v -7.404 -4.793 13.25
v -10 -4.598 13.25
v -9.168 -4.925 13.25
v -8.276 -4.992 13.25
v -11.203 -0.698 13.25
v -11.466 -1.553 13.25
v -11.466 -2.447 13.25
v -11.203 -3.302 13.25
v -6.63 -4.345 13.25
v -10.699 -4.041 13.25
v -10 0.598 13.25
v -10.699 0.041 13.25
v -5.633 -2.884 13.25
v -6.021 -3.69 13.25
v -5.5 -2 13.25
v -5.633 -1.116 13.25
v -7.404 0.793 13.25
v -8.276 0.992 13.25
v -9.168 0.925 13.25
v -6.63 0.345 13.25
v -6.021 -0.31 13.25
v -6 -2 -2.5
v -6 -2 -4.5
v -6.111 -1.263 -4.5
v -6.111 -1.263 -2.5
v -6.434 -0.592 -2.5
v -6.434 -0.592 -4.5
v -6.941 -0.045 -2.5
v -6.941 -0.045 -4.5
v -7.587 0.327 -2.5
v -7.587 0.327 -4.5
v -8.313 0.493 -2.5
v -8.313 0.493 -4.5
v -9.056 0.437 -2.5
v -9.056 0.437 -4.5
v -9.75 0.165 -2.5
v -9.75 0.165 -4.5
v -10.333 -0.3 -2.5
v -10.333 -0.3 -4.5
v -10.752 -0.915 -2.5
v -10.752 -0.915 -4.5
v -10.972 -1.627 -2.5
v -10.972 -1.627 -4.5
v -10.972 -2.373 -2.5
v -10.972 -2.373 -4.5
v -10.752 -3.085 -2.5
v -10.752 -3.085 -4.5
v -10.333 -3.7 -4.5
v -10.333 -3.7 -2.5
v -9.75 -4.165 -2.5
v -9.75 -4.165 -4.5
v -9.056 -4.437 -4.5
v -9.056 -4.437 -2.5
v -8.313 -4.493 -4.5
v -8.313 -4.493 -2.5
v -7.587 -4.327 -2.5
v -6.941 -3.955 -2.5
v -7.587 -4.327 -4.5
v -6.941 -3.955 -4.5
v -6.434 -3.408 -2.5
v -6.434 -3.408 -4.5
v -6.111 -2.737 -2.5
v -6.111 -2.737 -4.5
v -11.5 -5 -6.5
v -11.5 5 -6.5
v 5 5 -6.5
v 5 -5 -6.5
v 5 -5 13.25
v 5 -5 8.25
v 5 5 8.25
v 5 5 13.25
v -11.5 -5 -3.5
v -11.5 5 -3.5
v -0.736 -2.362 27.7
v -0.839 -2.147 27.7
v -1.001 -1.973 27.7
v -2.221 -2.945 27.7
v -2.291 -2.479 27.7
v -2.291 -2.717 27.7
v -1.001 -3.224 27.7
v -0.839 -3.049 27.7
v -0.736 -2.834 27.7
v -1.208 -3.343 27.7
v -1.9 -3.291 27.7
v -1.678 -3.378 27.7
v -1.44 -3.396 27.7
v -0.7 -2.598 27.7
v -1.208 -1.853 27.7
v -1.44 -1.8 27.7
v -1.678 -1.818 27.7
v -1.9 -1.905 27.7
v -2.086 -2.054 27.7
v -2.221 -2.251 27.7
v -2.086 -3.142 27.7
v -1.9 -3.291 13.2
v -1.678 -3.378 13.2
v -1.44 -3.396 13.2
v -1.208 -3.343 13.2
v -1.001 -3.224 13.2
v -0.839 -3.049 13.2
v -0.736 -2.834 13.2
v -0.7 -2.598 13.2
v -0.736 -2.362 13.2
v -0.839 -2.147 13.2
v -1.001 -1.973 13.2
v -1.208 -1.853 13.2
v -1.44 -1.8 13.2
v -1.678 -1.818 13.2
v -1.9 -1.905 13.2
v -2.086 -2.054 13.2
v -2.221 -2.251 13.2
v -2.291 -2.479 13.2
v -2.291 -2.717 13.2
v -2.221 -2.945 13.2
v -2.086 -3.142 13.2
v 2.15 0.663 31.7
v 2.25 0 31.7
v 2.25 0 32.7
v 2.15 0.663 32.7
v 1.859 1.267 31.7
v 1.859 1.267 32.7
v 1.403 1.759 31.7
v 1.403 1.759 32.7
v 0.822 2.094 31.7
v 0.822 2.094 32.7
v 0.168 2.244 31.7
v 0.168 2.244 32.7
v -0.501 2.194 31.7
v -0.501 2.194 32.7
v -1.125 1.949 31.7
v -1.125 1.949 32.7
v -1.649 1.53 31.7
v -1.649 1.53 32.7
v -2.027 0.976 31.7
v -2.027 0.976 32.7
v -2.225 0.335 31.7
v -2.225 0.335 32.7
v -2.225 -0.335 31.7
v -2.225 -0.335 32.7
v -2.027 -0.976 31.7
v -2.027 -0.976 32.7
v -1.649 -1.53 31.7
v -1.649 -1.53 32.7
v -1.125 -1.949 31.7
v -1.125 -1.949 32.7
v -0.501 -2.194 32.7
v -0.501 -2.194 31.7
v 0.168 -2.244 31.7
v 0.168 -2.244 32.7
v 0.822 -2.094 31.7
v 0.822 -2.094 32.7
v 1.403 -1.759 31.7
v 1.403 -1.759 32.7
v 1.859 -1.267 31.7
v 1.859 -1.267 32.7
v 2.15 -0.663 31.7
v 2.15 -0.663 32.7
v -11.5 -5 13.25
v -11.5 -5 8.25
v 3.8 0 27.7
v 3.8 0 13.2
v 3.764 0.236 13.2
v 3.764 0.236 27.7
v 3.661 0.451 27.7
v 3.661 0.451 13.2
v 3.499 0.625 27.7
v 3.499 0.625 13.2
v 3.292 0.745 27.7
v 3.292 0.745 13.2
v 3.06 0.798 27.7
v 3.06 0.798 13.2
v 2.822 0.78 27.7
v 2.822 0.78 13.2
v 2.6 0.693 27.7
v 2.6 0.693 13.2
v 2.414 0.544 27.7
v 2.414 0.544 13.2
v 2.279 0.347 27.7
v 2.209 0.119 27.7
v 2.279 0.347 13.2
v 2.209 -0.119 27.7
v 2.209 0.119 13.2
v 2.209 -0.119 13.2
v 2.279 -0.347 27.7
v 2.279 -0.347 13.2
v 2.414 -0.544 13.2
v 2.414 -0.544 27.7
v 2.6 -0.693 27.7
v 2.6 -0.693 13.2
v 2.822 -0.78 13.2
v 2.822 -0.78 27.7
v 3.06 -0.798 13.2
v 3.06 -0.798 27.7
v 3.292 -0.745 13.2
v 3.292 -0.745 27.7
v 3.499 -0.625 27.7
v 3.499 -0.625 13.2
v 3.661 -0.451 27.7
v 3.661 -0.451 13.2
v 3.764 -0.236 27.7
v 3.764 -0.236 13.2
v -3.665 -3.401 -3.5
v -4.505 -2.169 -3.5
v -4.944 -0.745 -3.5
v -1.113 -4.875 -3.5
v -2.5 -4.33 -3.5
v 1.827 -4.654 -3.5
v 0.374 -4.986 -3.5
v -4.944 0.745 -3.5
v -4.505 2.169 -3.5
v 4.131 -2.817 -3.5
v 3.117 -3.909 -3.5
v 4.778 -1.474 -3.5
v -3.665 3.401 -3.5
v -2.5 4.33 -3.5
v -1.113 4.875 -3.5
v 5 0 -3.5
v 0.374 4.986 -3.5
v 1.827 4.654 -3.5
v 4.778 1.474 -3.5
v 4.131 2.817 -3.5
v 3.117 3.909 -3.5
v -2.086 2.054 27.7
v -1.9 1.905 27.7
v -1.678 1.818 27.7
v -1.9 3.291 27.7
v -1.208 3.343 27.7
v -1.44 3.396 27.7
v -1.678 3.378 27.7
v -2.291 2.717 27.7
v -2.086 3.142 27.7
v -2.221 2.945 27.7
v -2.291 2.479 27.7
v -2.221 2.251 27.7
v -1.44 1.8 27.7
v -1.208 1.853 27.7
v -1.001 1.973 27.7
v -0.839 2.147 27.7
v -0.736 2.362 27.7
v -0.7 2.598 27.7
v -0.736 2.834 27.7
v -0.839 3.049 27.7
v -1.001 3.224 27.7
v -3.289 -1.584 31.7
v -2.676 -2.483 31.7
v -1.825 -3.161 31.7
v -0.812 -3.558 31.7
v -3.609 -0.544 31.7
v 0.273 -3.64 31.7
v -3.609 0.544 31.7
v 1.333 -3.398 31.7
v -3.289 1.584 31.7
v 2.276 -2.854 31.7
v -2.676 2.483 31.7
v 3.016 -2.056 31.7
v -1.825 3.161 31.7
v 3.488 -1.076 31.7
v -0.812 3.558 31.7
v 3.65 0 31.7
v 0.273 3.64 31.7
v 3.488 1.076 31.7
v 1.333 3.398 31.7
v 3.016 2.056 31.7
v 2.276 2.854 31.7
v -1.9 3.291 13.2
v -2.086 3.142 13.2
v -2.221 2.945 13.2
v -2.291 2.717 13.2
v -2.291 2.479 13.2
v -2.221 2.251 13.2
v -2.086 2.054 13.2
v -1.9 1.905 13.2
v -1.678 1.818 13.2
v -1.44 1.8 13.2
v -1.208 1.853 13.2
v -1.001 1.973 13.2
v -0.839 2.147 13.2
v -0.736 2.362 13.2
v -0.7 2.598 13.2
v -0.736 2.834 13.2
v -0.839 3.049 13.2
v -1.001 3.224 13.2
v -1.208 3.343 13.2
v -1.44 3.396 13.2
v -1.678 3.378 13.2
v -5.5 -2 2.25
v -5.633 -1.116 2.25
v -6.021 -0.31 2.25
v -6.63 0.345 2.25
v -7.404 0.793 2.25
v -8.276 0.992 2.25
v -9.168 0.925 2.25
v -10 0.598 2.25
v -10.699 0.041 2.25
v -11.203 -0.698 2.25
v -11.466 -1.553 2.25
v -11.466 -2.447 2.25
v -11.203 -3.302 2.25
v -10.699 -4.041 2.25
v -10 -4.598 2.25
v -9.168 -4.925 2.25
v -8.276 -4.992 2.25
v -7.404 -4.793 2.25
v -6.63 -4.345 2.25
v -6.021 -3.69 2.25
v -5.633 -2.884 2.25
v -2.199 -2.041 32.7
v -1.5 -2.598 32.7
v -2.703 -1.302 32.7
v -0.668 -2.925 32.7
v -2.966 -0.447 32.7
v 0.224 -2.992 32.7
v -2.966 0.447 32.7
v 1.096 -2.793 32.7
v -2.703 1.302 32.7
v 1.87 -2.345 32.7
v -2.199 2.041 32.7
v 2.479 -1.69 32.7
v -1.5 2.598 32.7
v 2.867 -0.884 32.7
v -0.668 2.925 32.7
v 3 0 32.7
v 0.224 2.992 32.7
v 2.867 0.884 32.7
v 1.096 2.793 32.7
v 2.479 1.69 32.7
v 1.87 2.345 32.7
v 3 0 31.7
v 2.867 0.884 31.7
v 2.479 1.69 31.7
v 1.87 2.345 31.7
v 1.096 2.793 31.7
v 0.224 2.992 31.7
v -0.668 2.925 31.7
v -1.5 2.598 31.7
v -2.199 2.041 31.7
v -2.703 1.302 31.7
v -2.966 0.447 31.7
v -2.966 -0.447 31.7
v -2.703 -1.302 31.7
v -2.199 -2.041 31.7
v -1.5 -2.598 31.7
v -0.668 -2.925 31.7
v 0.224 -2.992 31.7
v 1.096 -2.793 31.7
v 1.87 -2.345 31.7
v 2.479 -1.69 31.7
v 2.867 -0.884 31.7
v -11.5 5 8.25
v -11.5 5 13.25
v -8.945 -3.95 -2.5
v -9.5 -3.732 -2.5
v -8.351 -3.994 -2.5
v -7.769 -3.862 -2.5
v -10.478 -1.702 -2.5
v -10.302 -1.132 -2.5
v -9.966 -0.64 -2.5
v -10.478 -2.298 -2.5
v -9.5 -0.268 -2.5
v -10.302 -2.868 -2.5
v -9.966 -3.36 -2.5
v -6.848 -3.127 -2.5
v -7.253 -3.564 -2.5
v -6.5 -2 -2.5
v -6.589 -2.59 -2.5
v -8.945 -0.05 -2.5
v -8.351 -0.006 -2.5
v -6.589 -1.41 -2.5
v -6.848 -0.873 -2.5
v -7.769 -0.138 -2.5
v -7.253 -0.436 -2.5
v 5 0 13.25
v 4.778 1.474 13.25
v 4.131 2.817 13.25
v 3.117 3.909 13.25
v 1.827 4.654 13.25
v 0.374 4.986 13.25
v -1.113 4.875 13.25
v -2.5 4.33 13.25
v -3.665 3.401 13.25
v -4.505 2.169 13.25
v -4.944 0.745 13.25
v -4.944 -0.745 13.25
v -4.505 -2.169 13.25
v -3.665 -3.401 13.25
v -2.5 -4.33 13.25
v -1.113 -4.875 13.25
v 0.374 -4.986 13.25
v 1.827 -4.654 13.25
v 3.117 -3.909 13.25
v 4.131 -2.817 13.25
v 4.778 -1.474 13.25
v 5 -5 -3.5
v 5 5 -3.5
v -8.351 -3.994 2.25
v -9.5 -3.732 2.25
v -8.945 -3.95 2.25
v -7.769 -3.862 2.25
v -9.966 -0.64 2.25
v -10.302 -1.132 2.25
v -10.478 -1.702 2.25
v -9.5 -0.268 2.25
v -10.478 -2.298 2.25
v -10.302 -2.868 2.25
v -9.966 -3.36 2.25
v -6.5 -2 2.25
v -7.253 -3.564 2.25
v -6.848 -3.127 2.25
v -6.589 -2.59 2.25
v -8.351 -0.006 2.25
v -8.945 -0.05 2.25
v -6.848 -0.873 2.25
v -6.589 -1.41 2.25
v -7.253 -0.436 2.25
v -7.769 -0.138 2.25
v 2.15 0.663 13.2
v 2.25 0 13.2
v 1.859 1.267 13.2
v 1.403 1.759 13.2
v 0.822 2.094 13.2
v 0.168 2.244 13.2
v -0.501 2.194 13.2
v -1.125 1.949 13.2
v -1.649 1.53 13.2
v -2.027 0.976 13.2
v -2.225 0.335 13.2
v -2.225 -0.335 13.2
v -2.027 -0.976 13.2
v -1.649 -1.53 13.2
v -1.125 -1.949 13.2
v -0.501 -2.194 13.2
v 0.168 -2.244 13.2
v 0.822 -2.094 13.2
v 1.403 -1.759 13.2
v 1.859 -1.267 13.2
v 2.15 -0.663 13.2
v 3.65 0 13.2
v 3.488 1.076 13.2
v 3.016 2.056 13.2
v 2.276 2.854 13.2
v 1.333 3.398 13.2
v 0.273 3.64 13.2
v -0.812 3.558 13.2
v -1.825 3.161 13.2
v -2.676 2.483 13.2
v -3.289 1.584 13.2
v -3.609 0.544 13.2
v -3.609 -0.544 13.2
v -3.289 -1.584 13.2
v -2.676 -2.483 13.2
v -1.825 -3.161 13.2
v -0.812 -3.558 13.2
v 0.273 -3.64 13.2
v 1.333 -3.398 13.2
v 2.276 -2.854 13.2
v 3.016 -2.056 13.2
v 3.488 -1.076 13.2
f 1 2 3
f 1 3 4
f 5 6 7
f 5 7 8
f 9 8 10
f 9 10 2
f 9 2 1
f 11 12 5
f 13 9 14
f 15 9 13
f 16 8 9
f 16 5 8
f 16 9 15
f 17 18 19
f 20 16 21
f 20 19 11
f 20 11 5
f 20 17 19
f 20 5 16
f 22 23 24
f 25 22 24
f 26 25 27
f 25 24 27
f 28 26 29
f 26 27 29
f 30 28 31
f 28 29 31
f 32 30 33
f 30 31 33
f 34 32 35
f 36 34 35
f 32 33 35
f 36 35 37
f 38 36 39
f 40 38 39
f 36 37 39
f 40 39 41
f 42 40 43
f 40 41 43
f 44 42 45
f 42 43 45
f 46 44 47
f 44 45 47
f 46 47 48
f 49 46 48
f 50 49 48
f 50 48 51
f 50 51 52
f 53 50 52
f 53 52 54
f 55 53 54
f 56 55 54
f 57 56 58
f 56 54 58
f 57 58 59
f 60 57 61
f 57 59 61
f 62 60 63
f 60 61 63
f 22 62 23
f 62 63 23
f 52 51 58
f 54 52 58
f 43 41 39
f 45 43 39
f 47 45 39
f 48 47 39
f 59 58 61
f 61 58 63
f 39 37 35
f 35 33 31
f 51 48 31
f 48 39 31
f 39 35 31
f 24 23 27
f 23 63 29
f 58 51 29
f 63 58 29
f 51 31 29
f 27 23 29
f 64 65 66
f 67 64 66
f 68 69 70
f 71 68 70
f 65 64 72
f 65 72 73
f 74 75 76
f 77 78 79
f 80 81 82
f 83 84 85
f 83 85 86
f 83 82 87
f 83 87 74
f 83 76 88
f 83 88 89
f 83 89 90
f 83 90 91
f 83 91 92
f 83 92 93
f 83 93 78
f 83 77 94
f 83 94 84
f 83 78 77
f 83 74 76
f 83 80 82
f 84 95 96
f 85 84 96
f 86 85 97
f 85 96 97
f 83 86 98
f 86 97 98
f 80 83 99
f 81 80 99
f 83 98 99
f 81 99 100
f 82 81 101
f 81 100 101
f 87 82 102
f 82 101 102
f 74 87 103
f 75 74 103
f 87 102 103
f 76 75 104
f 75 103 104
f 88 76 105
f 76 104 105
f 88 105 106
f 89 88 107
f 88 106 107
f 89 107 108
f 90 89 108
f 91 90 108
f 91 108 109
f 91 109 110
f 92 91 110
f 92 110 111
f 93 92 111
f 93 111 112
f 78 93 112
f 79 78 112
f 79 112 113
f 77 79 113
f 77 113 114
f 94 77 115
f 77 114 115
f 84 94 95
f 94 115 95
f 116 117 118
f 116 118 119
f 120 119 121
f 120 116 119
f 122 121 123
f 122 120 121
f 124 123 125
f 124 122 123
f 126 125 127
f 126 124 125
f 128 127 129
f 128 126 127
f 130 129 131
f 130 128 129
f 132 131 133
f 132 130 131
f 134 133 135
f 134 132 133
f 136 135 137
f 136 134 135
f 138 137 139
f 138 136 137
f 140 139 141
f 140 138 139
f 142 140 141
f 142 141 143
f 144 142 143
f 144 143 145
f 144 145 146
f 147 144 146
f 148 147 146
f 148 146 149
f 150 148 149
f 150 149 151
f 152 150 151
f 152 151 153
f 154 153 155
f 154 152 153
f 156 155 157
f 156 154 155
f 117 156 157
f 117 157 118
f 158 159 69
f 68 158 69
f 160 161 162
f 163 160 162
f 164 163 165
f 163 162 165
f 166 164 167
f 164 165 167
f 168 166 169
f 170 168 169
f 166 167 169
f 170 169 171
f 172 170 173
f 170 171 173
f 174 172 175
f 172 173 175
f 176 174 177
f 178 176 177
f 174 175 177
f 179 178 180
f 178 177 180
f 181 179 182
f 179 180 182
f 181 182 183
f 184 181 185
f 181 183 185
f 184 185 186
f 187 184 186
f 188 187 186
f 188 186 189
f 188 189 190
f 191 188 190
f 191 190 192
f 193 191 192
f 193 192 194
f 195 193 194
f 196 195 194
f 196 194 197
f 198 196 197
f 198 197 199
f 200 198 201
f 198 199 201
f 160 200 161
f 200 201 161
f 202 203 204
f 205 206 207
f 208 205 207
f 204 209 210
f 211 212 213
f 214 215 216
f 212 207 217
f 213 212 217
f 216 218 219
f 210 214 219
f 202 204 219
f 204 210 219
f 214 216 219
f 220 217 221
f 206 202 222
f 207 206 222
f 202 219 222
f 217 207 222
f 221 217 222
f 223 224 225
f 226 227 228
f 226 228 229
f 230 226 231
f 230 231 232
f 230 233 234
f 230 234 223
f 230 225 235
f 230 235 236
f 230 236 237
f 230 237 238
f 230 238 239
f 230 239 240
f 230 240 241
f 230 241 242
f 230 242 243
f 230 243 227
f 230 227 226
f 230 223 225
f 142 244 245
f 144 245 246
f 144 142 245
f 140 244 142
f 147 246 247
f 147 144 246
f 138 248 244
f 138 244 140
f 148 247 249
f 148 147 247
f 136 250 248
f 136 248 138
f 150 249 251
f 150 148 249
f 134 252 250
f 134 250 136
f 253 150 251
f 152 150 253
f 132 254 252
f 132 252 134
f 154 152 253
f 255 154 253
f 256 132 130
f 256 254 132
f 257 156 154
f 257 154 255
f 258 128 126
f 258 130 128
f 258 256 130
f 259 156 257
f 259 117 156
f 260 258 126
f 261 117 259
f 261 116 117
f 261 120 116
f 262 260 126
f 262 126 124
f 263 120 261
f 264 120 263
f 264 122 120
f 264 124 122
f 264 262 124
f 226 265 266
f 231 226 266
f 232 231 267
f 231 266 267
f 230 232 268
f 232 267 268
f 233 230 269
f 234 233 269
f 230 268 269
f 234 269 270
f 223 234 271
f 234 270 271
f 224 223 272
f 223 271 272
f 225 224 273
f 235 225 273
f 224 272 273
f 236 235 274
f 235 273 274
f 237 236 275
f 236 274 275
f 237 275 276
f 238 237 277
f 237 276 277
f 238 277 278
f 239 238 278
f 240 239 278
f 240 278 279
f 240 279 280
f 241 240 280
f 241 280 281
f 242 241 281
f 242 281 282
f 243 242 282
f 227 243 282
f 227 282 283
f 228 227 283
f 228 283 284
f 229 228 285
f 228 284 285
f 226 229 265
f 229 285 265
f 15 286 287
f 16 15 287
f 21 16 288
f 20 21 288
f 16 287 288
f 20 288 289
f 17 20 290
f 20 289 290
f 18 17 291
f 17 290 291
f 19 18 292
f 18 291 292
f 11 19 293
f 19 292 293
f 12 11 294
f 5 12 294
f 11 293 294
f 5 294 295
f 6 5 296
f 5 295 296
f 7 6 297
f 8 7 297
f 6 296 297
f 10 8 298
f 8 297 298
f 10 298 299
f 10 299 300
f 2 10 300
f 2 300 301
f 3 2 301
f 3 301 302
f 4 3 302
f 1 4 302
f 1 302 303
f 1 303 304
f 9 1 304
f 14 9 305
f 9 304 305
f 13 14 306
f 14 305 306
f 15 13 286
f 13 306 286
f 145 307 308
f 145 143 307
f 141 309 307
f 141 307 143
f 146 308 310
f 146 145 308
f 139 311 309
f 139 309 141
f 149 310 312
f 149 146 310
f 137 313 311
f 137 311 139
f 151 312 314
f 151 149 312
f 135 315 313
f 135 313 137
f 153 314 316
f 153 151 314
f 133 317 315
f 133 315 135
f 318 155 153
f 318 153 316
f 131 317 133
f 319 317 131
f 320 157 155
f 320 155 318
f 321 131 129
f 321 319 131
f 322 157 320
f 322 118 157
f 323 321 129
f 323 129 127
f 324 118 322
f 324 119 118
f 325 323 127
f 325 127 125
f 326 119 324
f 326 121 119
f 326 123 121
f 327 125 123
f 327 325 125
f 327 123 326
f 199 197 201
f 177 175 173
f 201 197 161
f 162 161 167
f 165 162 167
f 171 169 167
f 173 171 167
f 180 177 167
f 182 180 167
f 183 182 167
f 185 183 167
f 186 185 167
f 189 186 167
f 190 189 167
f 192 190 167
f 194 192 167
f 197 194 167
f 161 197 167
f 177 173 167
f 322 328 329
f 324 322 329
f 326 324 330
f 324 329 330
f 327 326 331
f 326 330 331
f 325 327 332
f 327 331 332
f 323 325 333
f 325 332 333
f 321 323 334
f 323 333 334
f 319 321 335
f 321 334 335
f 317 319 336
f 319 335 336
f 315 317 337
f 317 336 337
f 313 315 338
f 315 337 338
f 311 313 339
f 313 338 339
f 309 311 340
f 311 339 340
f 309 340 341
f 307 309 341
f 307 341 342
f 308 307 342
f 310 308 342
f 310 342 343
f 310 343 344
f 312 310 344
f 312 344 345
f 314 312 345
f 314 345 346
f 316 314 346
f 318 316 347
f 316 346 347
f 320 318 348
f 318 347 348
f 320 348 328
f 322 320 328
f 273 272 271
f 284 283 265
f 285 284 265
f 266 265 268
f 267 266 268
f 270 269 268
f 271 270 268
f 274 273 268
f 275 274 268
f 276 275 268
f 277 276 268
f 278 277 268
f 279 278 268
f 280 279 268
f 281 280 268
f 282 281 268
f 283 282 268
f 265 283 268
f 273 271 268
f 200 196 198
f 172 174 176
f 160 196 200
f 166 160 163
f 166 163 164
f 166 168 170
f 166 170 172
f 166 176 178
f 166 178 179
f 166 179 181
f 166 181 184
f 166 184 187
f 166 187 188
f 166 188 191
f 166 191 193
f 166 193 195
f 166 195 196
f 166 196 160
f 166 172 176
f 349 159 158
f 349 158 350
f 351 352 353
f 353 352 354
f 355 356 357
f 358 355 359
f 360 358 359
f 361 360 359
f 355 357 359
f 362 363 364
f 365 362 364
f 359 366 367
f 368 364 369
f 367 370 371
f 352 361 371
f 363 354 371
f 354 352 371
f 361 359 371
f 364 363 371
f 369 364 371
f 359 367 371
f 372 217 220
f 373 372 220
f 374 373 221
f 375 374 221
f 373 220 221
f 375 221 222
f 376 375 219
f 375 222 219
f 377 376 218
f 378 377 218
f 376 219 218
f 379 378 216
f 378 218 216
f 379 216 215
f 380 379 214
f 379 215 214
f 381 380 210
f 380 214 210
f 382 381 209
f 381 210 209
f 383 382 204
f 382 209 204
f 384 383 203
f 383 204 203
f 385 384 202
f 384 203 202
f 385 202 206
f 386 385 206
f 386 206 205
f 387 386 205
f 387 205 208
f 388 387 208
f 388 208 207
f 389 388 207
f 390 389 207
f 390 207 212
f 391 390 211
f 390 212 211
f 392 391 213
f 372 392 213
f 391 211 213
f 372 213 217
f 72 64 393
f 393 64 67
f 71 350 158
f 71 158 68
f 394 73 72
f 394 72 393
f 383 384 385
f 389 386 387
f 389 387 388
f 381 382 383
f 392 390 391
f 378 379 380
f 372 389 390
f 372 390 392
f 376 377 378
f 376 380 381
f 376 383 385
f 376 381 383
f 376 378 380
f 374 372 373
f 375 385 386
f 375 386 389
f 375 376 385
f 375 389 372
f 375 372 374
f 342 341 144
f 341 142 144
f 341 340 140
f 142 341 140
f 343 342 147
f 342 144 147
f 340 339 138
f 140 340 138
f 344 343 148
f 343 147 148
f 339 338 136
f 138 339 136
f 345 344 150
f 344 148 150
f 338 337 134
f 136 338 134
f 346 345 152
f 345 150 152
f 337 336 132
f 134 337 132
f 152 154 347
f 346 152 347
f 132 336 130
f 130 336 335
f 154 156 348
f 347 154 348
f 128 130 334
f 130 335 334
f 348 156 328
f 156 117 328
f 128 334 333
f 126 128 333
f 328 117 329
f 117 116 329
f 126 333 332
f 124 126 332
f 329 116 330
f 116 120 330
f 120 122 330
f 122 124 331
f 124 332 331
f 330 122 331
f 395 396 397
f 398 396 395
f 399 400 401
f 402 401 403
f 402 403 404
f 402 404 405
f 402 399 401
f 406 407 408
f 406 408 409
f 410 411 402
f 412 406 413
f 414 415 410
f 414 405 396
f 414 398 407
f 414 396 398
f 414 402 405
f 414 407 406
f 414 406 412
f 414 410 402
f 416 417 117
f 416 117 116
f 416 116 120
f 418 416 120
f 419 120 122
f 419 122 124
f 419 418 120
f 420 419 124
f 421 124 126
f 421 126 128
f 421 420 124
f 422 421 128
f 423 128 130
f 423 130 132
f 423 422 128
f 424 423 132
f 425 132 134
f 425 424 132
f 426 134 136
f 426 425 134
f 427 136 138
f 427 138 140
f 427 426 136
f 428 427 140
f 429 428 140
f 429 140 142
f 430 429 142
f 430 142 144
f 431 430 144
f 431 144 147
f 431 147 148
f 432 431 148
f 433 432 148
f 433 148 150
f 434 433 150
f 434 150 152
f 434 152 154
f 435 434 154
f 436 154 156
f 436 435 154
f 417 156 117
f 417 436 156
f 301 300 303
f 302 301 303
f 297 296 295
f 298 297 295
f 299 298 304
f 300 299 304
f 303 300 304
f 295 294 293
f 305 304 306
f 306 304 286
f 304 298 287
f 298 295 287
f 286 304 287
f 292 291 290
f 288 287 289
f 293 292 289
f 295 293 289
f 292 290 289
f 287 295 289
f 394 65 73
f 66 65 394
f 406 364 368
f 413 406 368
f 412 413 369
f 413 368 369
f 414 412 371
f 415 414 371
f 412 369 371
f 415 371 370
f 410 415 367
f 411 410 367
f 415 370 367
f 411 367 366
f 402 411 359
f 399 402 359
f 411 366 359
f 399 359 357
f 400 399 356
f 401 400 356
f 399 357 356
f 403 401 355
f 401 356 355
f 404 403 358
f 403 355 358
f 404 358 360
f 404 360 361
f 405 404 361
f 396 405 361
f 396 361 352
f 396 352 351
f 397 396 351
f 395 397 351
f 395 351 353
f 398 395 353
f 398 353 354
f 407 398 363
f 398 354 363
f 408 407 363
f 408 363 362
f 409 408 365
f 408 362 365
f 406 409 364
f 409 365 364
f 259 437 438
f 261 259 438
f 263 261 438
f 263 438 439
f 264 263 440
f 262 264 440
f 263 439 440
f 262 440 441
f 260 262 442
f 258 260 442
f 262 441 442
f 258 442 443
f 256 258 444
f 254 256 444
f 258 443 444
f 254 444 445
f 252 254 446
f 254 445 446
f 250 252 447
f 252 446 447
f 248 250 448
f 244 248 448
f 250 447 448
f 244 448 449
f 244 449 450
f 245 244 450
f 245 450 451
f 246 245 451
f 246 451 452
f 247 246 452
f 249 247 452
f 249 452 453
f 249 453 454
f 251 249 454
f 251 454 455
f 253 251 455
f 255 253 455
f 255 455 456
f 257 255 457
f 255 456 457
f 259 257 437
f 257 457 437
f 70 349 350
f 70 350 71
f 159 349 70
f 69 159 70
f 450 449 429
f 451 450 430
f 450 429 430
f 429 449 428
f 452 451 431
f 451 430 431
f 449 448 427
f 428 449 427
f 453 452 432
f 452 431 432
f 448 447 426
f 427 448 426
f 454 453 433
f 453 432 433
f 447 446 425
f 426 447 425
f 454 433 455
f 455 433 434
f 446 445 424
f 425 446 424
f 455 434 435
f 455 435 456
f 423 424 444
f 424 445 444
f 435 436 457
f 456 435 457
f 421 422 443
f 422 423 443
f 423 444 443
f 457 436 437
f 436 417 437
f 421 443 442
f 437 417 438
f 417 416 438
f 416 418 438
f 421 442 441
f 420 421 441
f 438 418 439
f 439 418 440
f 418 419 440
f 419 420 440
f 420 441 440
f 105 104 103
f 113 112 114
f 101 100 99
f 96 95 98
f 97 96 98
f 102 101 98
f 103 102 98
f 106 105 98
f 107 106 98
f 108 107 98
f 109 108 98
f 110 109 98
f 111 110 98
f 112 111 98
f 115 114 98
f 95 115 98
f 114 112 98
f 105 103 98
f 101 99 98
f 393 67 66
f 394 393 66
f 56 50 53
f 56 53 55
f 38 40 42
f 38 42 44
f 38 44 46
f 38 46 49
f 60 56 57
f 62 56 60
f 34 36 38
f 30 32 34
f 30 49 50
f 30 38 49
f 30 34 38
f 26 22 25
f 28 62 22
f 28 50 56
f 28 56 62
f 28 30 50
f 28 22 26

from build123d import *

# Parameters (mm, degrees)
CYLINDER_R                  = 3
CYLINDER_DEPTH              = 11
CYLINDER001_R               = 2
CYLINDER001_DEPTH           = 4.75
CYLINDER002_R               = 2.5
CYLINDER002_DEPTH           = 2
CYLINDER006_R               = 0.8
CYLINDER006_DEPTH           = 14.5
CYLINDER007_R               = 2.25
CYLINDER007_DEPTH           = 18.5
CYLINDER003_R               = 3.65
CYLINDER003_DEPTH           = 18.5
CYLINDER005_R               = 2.25
CYLINDER005_DEPTH           = 1
CYLINDER004_R               = 3
CYLINDER004_DEPTH           = 1
CYLINDER008_R               = 0.8
CYLINDER008_DEPTH           = 14.5
CYLINDER008_PLACEMENT_ANGLE = 120
CYLINDER009_R               = 0.8
CYLINDER009_DEPTH           = 14.5
CYLINDER009_PLACEMENT_ANGLE = 240
BOX_W                       = 16.5
BOX_H                       = 10
BOX_DEPTH                   = 5
CYLINDER010_R               = 5
CYLINDER010_DEPTH           = 16.75
BOX001_W                    = 16.5
BOX001_H                    = 10
BOX001_DEPTH                = 3


with BuildPart() as bottom_upper:
    # Cylinder → Cylinder (new body)
    with BuildSketch(Plane(origin=(-8.5, -2, 2.25), x_dir=(1, 0, 0), z_dir=(0, 0, 1))):
        Circle(CYLINDER_R)
    extrude(amount=CYLINDER_DEPTH)


with BuildPart() as cable_tie_groove:
    # Cylinder001 → Cylinder001 (new body)
    with BuildSketch(Plane(origin=(-8.5, -2, -2.5), x_dir=(1, 0, 0), z_dir=(0, 0, 1))):
        Circle(CYLINDER001_R)
    extrude(amount=CYLINDER001_DEPTH)


with BuildPart() as bottom_lower:
    # Cylinder002 → Cylinder002 (new body)
    with BuildSketch(Plane(origin=(-8.5, -2, -4.5), x_dir=(1, 0, 0), z_dir=(0, 0, 1))):
        Circle(CYLINDER002_R)
    extrude(amount=CYLINDER002_DEPTH)


with BuildPart() as cylinder006:
    # Cylinder006 → Cylinder006 (new body)
    with BuildSketch(Plane(origin=(3, 0, 13.2), x_dir=(1, 0, 0), z_dir=(0, 0, 1))):
        Circle(CYLINDER006_R)
    extrude(amount=CYLINDER006_DEPTH)


with BuildPart() as cylinder007:
    # Cylinder007 → Cylinder007 (new body)
    with BuildSketch(Plane.XY.offset(13.2)):
        Circle(CYLINDER007_R)
    extrude(amount=CYLINDER007_DEPTH)


with BuildPart() as cut:
    # Cylinder003 → Cylinder003 (new body)
    with BuildSketch(Plane.XY.offset(13.2)):
        Circle(CYLINDER003_R)
    extrude(amount=CYLINDER003_DEPTH)

    # Cut: cut Cylinder007
    add(cylinder007.part, mode=Mode.SUBTRACT)


with BuildPart() as cylinder005:
    # Cylinder005 → Cylinder005 (new body)
    with BuildSketch(Plane.XY.offset(31.7)):
        Circle(CYLINDER005_R)
    extrude(amount=CYLINDER005_DEPTH)


with BuildPart() as cut001:
    # Cylinder004 → Cylinder004 (new body)
    with BuildSketch(Plane.XY.offset(31.7)):
        Circle(CYLINDER004_R)
    extrude(amount=CYLINDER004_DEPTH)

    # Cut001: cut Cylinder005
    add(cylinder005.part, mode=Mode.SUBTRACT)


with BuildPart() as cylinder008:
    # Cylinder008 → Cylinder008 (new body)
    with BuildSketch(Plane.XY):
        Circle(CYLINDER008_R)
    extrude(amount=CYLINDER008_DEPTH)


with BuildPart() as cylinder008_1:
    # Cylinder008 placement: moved
    add(cylinder008.part.moved(Location((-1.5, 2.598076, 13.2))).rotate(Axis((-1.5, 2.598076, 13.2), (0, 0, 1)), CYLINDER008_PLACEMENT_ANGLE))


with BuildPart() as cylinder009:
    # Cylinder009 → Cylinder009 (new body)
    with BuildSketch(Plane.XY):
        Circle(CYLINDER009_R)
    extrude(amount=CYLINDER009_DEPTH)


with BuildPart() as cylinder009_1:
    # Cylinder009 placement: moved
    add(cylinder009.part.moved(Location((-1.5, -2.598076, 13.2))).rotate(Axis((-1.5, -2.598076, 13.2), (0, 0, 1)), CYLINDER009_PLACEMENT_ANGLE))


with BuildPart() as cube_top:
    # Box → Box (new body)
    with BuildSketch(Plane(origin=(-11.5, -5, 8.25), x_dir=(1, 0, 0), z_dir=(0, 0, 1))):
        with Locations((8.25, 5)):
            Rectangle(BOX_W, BOX_H)
    extrude(amount=BOX_DEPTH)


with BuildPart() as bottom_other:
    # Cylinder010 → Cylinder010 (new body)
    with BuildSketch(Plane.XY.offset(-3.5)):
        Circle(CYLINDER010_R)
    extrude(amount=CYLINDER010_DEPTH)


with BuildPart() as cube_bottom:
    # Box001 → Box001 (new body)
    with BuildSketch(Plane(origin=(-11.5, -5, -6.5), x_dir=(1, 0, 0), z_dir=(0, 0, 1))):
        with Locations((8.25, 5)):
            Rectangle(BOX001_W, BOX001_H)
    extrude(amount=BOX001_DEPTH)


solid = Compound([bottom_upper.part, cable_tie_groove.part, bottom_lower.part, cylinder006.part, cut.part, cut001.part, cylinder008_1.part, cylinder009_1.part, cube_top.part, bottom_other.part, cube_bottom.part])
